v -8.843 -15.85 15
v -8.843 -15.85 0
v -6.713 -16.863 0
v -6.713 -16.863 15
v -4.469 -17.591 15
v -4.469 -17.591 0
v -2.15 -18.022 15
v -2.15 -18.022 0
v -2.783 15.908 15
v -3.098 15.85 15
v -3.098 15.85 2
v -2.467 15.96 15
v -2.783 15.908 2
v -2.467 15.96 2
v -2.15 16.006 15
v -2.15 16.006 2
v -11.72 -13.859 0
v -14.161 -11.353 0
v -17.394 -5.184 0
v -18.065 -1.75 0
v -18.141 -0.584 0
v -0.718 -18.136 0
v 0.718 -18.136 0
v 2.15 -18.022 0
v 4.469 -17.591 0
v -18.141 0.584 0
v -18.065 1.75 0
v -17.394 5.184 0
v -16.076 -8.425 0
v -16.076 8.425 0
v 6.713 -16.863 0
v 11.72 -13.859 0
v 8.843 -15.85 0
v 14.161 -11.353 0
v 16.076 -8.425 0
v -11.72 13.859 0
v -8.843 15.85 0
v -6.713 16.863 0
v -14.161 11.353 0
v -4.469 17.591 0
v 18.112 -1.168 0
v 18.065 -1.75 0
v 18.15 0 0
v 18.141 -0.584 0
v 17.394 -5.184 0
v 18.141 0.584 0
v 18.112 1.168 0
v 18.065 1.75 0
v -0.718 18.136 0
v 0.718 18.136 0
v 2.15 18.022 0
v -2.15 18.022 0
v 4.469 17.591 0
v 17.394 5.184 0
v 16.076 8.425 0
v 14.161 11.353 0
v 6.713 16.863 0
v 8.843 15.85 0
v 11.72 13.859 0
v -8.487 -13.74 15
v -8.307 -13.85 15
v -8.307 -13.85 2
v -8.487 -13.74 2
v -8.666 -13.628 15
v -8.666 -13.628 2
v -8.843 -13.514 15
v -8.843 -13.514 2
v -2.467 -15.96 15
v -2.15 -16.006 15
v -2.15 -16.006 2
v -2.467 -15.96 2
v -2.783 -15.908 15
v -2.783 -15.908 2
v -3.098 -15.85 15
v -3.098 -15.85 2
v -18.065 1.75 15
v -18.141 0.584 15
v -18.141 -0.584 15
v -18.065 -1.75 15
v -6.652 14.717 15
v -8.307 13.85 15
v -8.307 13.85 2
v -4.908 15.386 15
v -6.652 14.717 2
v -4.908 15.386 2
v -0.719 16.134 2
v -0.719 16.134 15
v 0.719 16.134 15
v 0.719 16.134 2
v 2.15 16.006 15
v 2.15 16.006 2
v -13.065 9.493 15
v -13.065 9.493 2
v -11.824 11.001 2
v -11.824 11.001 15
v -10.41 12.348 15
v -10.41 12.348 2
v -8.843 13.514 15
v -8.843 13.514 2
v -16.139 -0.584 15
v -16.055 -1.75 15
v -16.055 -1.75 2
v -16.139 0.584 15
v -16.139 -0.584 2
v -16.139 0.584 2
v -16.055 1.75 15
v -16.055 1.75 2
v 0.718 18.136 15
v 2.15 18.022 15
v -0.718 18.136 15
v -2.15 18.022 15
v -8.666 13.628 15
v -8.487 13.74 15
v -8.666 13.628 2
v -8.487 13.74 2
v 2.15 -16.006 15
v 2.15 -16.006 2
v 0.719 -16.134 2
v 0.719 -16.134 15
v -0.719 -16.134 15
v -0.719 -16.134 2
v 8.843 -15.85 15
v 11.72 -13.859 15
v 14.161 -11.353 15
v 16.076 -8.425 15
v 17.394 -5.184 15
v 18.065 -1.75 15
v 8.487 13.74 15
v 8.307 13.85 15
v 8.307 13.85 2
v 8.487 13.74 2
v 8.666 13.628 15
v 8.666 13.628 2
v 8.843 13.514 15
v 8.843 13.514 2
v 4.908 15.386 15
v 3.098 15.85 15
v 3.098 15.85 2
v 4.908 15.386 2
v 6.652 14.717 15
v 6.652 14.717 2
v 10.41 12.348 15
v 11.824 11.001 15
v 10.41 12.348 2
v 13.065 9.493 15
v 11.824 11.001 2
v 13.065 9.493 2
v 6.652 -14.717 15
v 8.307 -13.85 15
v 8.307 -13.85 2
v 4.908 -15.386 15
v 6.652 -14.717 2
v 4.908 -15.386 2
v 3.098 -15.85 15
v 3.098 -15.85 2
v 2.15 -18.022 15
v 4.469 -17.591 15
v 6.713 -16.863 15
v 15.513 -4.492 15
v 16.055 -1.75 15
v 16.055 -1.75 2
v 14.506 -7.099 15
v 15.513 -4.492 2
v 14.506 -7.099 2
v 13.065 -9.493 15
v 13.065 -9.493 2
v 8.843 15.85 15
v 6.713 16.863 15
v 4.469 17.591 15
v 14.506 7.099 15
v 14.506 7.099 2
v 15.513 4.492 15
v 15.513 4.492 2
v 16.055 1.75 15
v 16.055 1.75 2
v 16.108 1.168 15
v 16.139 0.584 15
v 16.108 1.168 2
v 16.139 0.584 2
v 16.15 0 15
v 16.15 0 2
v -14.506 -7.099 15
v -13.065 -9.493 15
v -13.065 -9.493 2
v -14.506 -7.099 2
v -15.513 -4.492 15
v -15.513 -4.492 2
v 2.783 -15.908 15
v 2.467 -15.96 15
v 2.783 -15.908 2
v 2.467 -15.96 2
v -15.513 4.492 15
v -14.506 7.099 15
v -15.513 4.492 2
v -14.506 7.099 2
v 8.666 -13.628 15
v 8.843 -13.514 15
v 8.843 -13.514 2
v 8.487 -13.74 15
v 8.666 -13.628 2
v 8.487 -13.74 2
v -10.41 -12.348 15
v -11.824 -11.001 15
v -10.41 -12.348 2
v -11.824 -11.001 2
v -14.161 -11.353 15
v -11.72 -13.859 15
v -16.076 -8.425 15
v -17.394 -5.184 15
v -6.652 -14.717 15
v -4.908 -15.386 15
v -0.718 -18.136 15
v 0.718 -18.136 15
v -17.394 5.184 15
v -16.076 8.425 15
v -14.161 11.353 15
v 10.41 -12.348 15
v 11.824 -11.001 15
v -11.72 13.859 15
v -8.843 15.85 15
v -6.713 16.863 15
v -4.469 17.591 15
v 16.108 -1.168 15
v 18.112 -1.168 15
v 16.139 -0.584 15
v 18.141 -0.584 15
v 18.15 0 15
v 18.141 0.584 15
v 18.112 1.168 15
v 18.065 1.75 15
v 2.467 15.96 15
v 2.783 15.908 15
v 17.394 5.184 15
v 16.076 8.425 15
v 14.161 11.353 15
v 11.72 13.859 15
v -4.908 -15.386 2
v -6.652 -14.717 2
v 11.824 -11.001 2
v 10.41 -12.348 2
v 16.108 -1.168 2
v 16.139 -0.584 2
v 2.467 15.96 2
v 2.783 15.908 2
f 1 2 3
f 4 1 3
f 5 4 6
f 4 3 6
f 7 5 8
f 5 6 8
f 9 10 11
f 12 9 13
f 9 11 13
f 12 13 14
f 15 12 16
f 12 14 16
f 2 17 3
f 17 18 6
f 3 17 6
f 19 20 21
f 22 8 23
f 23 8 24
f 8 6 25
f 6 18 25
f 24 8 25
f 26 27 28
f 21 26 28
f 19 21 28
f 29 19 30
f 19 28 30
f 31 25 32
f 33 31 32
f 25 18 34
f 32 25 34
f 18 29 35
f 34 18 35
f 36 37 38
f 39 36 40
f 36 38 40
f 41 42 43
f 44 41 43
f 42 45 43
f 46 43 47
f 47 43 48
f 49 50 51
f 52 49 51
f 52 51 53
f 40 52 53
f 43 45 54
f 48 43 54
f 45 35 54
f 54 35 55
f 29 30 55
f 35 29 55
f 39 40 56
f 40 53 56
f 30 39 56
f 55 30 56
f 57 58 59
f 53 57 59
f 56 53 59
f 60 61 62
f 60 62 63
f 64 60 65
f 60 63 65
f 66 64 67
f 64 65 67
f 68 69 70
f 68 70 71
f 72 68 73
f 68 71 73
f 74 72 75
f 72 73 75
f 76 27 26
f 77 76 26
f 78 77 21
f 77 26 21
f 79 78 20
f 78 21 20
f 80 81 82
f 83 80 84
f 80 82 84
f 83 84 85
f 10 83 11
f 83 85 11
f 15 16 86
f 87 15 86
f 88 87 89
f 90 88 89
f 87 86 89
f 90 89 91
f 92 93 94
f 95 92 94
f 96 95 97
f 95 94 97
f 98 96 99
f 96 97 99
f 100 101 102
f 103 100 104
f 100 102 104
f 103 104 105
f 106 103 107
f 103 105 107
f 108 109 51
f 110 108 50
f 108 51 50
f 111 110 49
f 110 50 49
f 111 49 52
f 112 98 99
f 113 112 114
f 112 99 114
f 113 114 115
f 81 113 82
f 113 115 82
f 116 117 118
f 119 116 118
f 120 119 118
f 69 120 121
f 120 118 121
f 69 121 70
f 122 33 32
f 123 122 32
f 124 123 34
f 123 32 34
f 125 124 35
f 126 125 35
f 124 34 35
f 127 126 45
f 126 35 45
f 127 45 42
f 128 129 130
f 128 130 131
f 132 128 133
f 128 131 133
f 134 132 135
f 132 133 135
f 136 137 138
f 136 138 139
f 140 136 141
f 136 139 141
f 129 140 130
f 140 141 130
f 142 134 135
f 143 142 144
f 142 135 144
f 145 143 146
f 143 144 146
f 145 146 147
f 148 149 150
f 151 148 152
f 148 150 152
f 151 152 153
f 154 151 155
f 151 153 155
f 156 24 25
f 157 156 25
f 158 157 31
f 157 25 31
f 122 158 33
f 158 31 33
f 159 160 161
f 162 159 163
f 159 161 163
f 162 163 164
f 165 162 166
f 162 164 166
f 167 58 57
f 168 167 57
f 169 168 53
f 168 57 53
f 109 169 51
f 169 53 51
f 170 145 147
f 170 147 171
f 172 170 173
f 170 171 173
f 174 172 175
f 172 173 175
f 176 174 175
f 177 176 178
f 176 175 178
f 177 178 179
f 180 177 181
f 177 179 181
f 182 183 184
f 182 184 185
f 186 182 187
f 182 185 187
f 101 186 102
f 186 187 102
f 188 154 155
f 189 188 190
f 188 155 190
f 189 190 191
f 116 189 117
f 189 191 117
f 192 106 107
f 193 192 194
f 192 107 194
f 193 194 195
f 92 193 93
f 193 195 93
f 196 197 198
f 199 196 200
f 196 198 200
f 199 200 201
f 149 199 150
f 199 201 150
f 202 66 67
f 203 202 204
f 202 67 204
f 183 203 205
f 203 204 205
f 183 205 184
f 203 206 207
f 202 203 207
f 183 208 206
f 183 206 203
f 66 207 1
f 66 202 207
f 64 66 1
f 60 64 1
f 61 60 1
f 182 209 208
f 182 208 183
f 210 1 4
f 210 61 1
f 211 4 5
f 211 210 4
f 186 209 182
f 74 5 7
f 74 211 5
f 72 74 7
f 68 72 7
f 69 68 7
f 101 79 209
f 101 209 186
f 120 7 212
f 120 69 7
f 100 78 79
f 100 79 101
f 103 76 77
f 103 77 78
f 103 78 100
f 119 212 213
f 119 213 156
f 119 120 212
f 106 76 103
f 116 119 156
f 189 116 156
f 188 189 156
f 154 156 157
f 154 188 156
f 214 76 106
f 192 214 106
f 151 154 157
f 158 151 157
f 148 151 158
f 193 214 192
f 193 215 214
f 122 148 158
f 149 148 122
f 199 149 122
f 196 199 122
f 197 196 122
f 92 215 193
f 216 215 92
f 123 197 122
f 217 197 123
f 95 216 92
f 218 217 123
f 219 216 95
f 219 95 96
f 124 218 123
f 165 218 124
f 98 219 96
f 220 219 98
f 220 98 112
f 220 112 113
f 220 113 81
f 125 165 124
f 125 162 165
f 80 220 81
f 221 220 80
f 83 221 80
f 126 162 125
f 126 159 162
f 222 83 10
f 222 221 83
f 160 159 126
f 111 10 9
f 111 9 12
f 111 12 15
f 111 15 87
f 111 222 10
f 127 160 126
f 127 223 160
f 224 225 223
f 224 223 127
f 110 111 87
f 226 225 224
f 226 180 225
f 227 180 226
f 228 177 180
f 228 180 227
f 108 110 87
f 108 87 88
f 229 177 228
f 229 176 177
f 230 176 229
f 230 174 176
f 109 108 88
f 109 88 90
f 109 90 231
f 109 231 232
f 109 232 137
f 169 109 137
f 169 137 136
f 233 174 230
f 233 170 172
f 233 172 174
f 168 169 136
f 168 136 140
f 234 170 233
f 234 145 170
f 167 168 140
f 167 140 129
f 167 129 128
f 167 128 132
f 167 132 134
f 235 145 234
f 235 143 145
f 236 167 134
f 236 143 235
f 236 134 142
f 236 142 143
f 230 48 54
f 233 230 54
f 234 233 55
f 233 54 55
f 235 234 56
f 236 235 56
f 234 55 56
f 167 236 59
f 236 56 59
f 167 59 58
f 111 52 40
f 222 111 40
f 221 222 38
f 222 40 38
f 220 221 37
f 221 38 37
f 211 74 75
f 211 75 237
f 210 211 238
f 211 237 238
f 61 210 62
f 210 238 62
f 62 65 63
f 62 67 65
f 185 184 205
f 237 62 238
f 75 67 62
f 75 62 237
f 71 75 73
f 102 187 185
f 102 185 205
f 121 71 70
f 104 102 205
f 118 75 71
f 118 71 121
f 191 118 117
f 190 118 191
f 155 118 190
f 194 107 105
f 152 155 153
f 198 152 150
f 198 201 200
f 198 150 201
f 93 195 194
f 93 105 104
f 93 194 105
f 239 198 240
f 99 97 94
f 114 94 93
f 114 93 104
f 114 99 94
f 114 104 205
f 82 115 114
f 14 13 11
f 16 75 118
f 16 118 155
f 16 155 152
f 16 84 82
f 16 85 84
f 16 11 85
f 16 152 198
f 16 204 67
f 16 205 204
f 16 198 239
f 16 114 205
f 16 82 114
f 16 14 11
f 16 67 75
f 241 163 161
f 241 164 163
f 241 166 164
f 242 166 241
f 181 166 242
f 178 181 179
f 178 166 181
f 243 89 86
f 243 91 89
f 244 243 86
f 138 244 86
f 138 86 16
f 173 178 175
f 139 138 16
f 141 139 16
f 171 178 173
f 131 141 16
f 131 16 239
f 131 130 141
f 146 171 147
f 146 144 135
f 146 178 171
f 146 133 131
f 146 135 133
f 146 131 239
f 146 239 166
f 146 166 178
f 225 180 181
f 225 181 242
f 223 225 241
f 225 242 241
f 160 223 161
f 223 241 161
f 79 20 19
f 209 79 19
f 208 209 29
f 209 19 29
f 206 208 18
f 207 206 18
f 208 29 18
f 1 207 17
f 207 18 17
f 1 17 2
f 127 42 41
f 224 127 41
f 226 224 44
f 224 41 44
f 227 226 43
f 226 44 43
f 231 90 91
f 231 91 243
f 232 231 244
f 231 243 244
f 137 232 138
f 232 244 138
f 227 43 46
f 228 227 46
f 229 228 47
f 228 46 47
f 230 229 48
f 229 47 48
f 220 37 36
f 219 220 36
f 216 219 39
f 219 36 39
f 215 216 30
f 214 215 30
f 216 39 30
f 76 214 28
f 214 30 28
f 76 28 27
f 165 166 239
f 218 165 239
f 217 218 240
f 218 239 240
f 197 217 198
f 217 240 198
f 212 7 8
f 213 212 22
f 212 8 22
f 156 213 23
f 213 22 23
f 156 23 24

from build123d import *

# Parameters (mm, degrees)
F1_DEPTH    = 15
F0_W        = 4.3
F0_H        = 4.3570096321
F0_W_2      = 4.2223602247
F0_H_2      = 3.5
F0_H_3      = 7.7429903679
F0_W_3      = 6.1566238629
F0_H_4      = 2
F0_W_4      = 0.5364525249
F0_W_5      = 2
F1_FACE_R   = 18.15
F1_FACE_R_2 = 16.15
F2_DEPTH    = 2


with BuildPart() as f1:
    # F0 (on Top) → F1 (new body)
    with BuildSketch(Plane.XY):
        with BuildLine():
            ThreePointArc((18.0654366125, -1.75), (18.1288468265, -0.876020971), (18.15, 0))
            ThreePointArc((18.15, 0), (18.1288468265, 0.876020971), (18.0654366125, 1.75))
            Line((18.0654366125, 1.75), (18.0654366125, -1.75))
        make_face()
        with BuildLine():
            Line((16.0549057923, 1.75), (18.0654366125, 1.75))
            ThreePointArc((18.0654366125, 1.75), (15.1894541696, 9.9349374446), (8.8430763878, 15.85))
            Line((8.8430763878, 15.85), (8.8430763878, 13.5137892539))
            ThreePointArc((8.8430763878, 13.5137892539), (11.1372097669, 11.6955144653), (13.0654366125, 9.4929903679))
            ThreePointArc((13.0654366125, 9.4929903679), (15.0660897516, 5.816823841), (16.0549057923, 1.75))
        make_face()
        with BuildLine():
            Line((18.0654366125, -1.75), (18.0654366125, 1.75))
            Line((18.0654366125, 1.75), (16.0549057923, 1.75))
            ThreePointArc((16.0549057923, 1.75), (16.1262089244, 0.8762908918), (16.15, 0))
            ThreePointArc((16.15, 0), (16.1262089244, -0.8762908918), (16.0549057923, -1.75))
            Line((16.0549057923, -1.75), (18.0654366125, -1.75))
        make_face()
        with BuildLine():
            ThreePointArc((8.8430763878, -15.85), (15.1894541696, -9.9349374446), (18.0654366125, -1.75))
            Line((18.0654366125, -1.75), (16.0549057923, -1.75))
            ThreePointArc((16.0549057923, -1.75), (15.0660897516, -5.816823841), (13.0654366125, -9.4929903679))
            ThreePointArc((13.0654366125, -9.4929903679), (11.1372097669, -11.6955144653), (8.8430763878, -13.5137892539))
            Line((8.8430763878, -13.5137892539), (8.8430763878, -15.85))
        make_face()
        with BuildLine():
            Line((3.098386677, 15.85), (8.8430763878, 15.85))
            ThreePointArc((8.8430763878, 15.85), (5.6028166651, 17.2635727883), (2.15, 18.0222085217))
            Line((2.15, 18.0222085217), (2.15, 16.0062487798))
            ThreePointArc((2.15, 16.0062487798), (2.6253559945, 15.9351813891), (3.098386677, 15.85))
        make_face()
        with BuildLine():
            Line((8.8430763878, 13.5137892539), (8.8430763878, 15.85))
            Line((8.8430763878, 15.85), (3.098386677, 15.85))
            ThreePointArc((3.098386677, 15.85), (5.7895221179, 15.0766021917), (8.3066238629, 13.85))
            ThreePointArc((8.3066238629, 13.85), (8.5764977752, 13.684523591), (8.8430763878, 13.5137892539))
        make_face()
        with BuildLine():
            ThreePointArc((2.15, -18.0222085217), (5.6028166651, -17.2635727883), (8.8430763878, -15.85))
            Line((8.8430763878, -15.85), (3.098386677, -15.85))
            ThreePointArc((3.098386677, -15.85), (2.6253559945, -15.9351813891), (2.15, -16.0062487798))
            Line((2.15, -16.0062487798), (2.15, -18.0222085217))
        make_face()
        with BuildLine():
            Line((3.098386677, -15.85), (8.8430763878, -15.85))
            Line((8.8430763878, -15.85), (8.8430763878, -13.5137892539))
            ThreePointArc((8.8430763878, -13.5137892539), (8.5764977752, -13.684523591), (8.3066238629, -13.85))
            ThreePointArc((8.3066238629, -13.85), (5.7895221179, -15.0766021917), (3.098386677, -15.85))
        make_face()
        with BuildLine():
            Line((-2.15, 18.0222085217), (2.15, 18.0222085217))
            ThreePointArc((2.15, 18.0222085217), (0, 18.15), (-2.15, 18.0222085217))
        make_face()
        with BuildLine():
            Line((2.15, 16.0062487798), (2.15, 18.0222085217))
            Line((2.15, 18.0222085217), (-2.15, 18.0222085217))
            Line((-2.15, 18.0222085217), (-2.15, 16.0062487798))
            ThreePointArc((-2.15, 16.0062487798), (0, 16.15), (2.15, 16.0062487798))
        make_face()
        with BuildLine():
            ThreePointArc((-2.15, -18.0222085217), (0, -18.15), (2.15, -18.0222085217))
            Line((2.15, -18.0222085217), (-2.15, -18.0222085217))
        make_face()
        with BuildLine():
            Line((-2.15, -18.0222085217), (2.15, -18.0222085217))
            Line((2.15, -18.0222085217), (2.15, -16.0062487798))
            ThreePointArc((2.15, -16.0062487798), (0, -16.15), (-2.15, -16.0062487798))
            Line((-2.15, -16.0062487798), (-2.15, -18.0222085217))
        make_face()
        with BuildLine():
            Line((-2.15, 16.0062487798), (-2.15, 18.0222085217))
            ThreePointArc((-2.15, 18.0222085217), (-5.6028166651, 17.2635727883), (-8.8430763878, 15.85))
            Line((-8.8430763878, 15.85), (-3.098386677, 15.85))
            ThreePointArc((-3.098386677, 15.85), (-2.6253559945, 15.9351813891), (-2.15, 16.0062487798))
        make_face()
        with BuildLine():
            ThreePointArc((-8.8430763878, -15.85), (-5.6028166651, -17.2635727883), (-2.15, -18.0222085217))
            Line((-2.15, -18.0222085217), (-2.15, -16.0062487798))
            ThreePointArc((-2.15, -16.0062487798), (-2.6253559945, -15.9351813891), (-3.098386677, -15.85))
            Line((-3.098386677, -15.85), (-8.8430763878, -15.85))
        make_face()
        with BuildLine():
            Line((-8.8430763878, 13.5137892539), (-8.8430763878, 15.85))
            ThreePointArc((-8.8430763878, 15.85), (-15.1894541696, 9.9349374446), (-18.0654366125, 1.75))
            Line((-18.0654366125, 1.75), (-16.0549057923, 1.75))
            ThreePointArc((-16.0549057923, 1.75), (-15.0660897516, 5.816823841), (-13.0654366125, 9.4929903679))
            ThreePointArc((-13.0654366125, 9.4929903679), (-11.1372097669, 11.6955144653), (-8.8430763878, 13.5137892539))
        make_face()
        with BuildLine():
            Line((-3.098386677, 15.85), (-8.8430763878, 15.85))
            Line((-8.8430763878, 15.85), (-8.8430763878, 13.5137892539))
            ThreePointArc((-8.8430763878, 13.5137892539), (-8.5764977752, 13.684523591), (-8.3066238629, 13.85))
            ThreePointArc((-8.3066238629, 13.85), (-5.7895221179, 15.0766021917), (-3.098386677, 15.85))
        make_face()
        with BuildLine():
            Line((-8.8430763878, -13.5137892539), (-8.8430763878, -15.85))
            Line((-8.8430763878, -15.85), (-3.098386677, -15.85))
            ThreePointArc((-3.098386677, -15.85), (-5.7895221179, -15.0766021917), (-8.3066238629, -13.85))
            ThreePointArc((-8.3066238629, -13.85), (-8.5764977752, -13.684523591), (-8.8430763878, -13.5137892539))
        make_face()
        with BuildLine():
            ThreePointArc((-18.0654366125, -1.75), (-15.1894541696, -9.9349374446), (-8.8430763878, -15.85))
            Line((-8.8430763878, -15.85), (-8.8430763878, -13.5137892539))
            ThreePointArc((-8.8430763878, -13.5137892539), (-11.1372097669, -11.6955144653), (-13.0654366125, -9.4929903679))
            ThreePointArc((-13.0654366125, -9.4929903679), (-15.0660897516, -5.816823841), (-16.0549057923, -1.75))
            Line((-16.0549057923, -1.75), (-18.0654366125, -1.75))
        make_face()
        with BuildLine():
            Line((-18.0654366125, -1.75), (-18.0654366125, 1.75))
            ThreePointArc((-18.0654366125, 1.75), (-18.15, 0), (-18.0654366125, -1.75))
        make_face()
        with BuildLine():
            Line((-16.0549057923, 1.75), (-18.0654366125, 1.75))
            Line((-18.0654366125, 1.75), (-18.0654366125, -1.75))
            Line((-18.0654366125, -1.75), (-16.0549057923, -1.75))
            ThreePointArc((-16.0549057923, -1.75), (-16.15, 0), (-16.0549057923, 1.75))
        make_face()
    extrude(amount=F1_DEPTH)

    # F0 (on Top) + F1_face (on face) → F2 (join)
    with BuildSketch(Plane.XY):
        with BuildLine():
            Line((-2.15, 18.0222085217), (2.15, 18.0222085217))
            ThreePointArc((2.15, 18.0222085217), (0, 18.15), (-2.15, 18.0222085217))
        make_face()
        with BuildLine():
            Line((-18.0654366125, -1.75), (-18.0654366125, 1.75))
            ThreePointArc((-18.0654366125, 1.75), (-18.15, 0), (-18.0654366125, -1.75))
        make_face()
        with BuildLine():
            ThreePointArc((-2.15, -18.0222085217), (0, -18.15), (2.15, -18.0222085217))
            Line((2.15, -18.0222085217), (-2.15, -18.0222085217))
        make_face()
        with BuildLine():
            ThreePointArc((18.0654366125, -1.75), (18.1288468265, -0.876020971), (18.15, 0))
            ThreePointArc((18.15, 0), (18.1288468265, 0.876020971), (18.0654366125, 1.75))
            Line((18.0654366125, 1.75), (18.0654366125, -1.75))
        make_face()
        with BuildLine():
            Line((3.098386677, 15.85), (8.8430763878, 15.85))
            ThreePointArc((8.8430763878, 15.85), (5.6028166651, 17.2635727883), (2.15, 18.0222085217))
            Line((2.15, 18.0222085217), (2.15, 16.0062487798))
            ThreePointArc((2.15, 16.0062487798), (2.6253559945, 15.9351813891), (3.098386677, 15.85))
        make_face()
        with BuildLine():
            Line((-2.15, 16.0062487798), (-2.15, 18.0222085217))
            ThreePointArc((-2.15, 18.0222085217), (-5.6028166651, 17.2635727883), (-8.8430763878, 15.85))
            Line((-8.8430763878, 15.85), (-3.098386677, 15.85))
            ThreePointArc((-3.098386677, 15.85), (-2.6253559945, 15.9351813891), (-2.15, 16.0062487798))
        make_face()
        with BuildLine():
            ThreePointArc((-8.8430763878, -15.85), (-5.6028166651, -17.2635727883), (-2.15, -18.0222085217))
            Line((-2.15, -18.0222085217), (-2.15, -16.0062487798))
            ThreePointArc((-2.15, -16.0062487798), (-2.6253559945, -15.9351813891), (-3.098386677, -15.85))
            Line((-3.098386677, -15.85), (-8.8430763878, -15.85))
        make_face()
        with BuildLine():
            ThreePointArc((2.15, -18.0222085217), (5.6028166651, -17.2635727883), (8.8430763878, -15.85))
            Line((8.8430763878, -15.85), (3.098386677, -15.85))
            ThreePointArc((3.098386677, -15.85), (2.6253559945, -15.9351813891), (2.15, -16.0062487798))
            Line((2.15, -16.0062487798), (2.15, -18.0222085217))
        make_face()
        with BuildLine():
            Line((16.0549057923, 1.75), (18.0654366125, 1.75))
            ThreePointArc((18.0654366125, 1.75), (15.1894541696, 9.9349374446), (8.8430763878, 15.85))
            Line((8.8430763878, 15.85), (8.8430763878, 13.5137892539))
            ThreePointArc((8.8430763878, 13.5137892539), (11.1372097669, 11.6955144653), (13.0654366125, 9.4929903679))
            ThreePointArc((13.0654366125, 9.4929903679), (15.0660897516, 5.816823841), (16.0549057923, 1.75))
        make_face()
        with BuildLine():
            Line((-8.8430763878, 13.5137892539), (-8.8430763878, 15.85))
            ThreePointArc((-8.8430763878, 15.85), (-15.1894541696, 9.9349374446), (-18.0654366125, 1.75))
            Line((-18.0654366125, 1.75), (-16.0549057923, 1.75))
            ThreePointArc((-16.0549057923, 1.75), (-15.0660897516, 5.816823841), (-13.0654366125, 9.4929903679))
            ThreePointArc((-13.0654366125, 9.4929903679), (-11.1372097669, 11.6955144653), (-8.8430763878, 13.5137892539))
        make_face()
        with BuildLine():
            ThreePointArc((-18.0654366125, -1.75), (-15.1894541696, -9.9349374446), (-8.8430763878, -15.85))
            Line((-8.8430763878, -15.85), (-8.8430763878, -13.5137892539))
            ThreePointArc((-8.8430763878, -13.5137892539), (-11.1372097669, -11.6955144653), (-13.0654366125, -9.4929903679))
            ThreePointArc((-13.0654366125, -9.4929903679), (-15.0660897516, -5.816823841), (-16.0549057923, -1.75))
            Line((-16.0549057923, -1.75), (-18.0654366125, -1.75))
        make_face()
        with BuildLine():
            ThreePointArc((8.8430763878, -15.85), (15.1894541696, -9.9349374446), (18.0654366125, -1.75))
            Line((18.0654366125, -1.75), (16.0549057923, -1.75))
            ThreePointArc((16.0549057923, -1.75), (15.0660897516, -5.816823841), (13.0654366125, -9.4929903679))
            ThreePointArc((13.0654366125, -9.4929903679), (11.1372097669, -11.6955144653), (8.8430763878, -13.5137892539))
            Line((8.8430763878, -13.5137892539), (8.8430763878, -15.85))
        make_face()
        with BuildLine():
            Line((-3.098386677, 15.85), (-8.8430763878, 15.85))
            Line((-8.8430763878, 15.85), (-8.8430763878, 13.5137892539))
            ThreePointArc((-8.8430763878, 13.5137892539), (-8.5764977752, 13.684523591), (-8.3066238629, 13.85))
            ThreePointArc((-8.3066238629, 13.85), (-5.7895221179, 15.0766021917), (-3.098386677, 15.85))
        make_face()
        with BuildLine():
            Line((8.8430763878, 13.5137892539), (8.8430763878, 15.85))
            Line((8.8430763878, 15.85), (3.098386677, 15.85))
            ThreePointArc((3.098386677, 15.85), (5.7895221179, 15.0766021917), (8.3066238629, 13.85))
            ThreePointArc((8.3066238629, 13.85), (8.5764977752, 13.684523591), (8.8430763878, 13.5137892539))
        make_face()
        with BuildLine():
            Line((-8.8430763878, -13.5137892539), (-8.8430763878, -15.85))
            Line((-8.8430763878, -15.85), (-3.098386677, -15.85))
            ThreePointArc((-3.098386677, -15.85), (-5.7895221179, -15.0766021917), (-8.3066238629, -13.85))
            ThreePointArc((-8.3066238629, -13.85), (-8.5764977752, -13.684523591), (-8.8430763878, -13.5137892539))
        make_face()
        with BuildLine():
            Line((3.098386677, -15.85), (8.8430763878, -15.85))
            Line((8.8430763878, -15.85), (8.8430763878, -13.5137892539))
            ThreePointArc((8.8430763878, -13.5137892539), (8.5764977752, -13.684523591), (8.3066238629, -13.85))
            ThreePointArc((8.3066238629, -13.85), (5.7895221179, -15.0766021917), (3.098386677, -15.85))
        make_face()
        with BuildLine():
            Line((2.15, 16.0062487798), (2.15, 18.0222085217))
            Line((2.15, 18.0222085217), (-2.15, 18.0222085217))
            Line((-2.15, 18.0222085217), (-2.15, 16.0062487798))
            ThreePointArc((-2.15, 16.0062487798), (0, 16.15), (2.15, 16.0062487798))
        make_face()
        with BuildLine():
            Line((-2.15, -18.0222085217), (2.15, -18.0222085217))
            Line((2.15, -18.0222085217), (2.15, -16.0062487798))
            ThreePointArc((2.15, -16.0062487798), (0, -16.15), (-2.15, -16.0062487798))
            Line((-2.15, -16.0062487798), (-2.15, -18.0222085217))
        make_face()
        with BuildLine():
            Line((-16.0549057923, 1.75), (-18.0654366125, 1.75))
            Line((-18.0654366125, 1.75), (-18.0654366125, -1.75))
            Line((-18.0654366125, -1.75), (-16.0549057923, -1.75))
            ThreePointArc((-16.0549057923, -1.75), (-16.15, 0), (-16.0549057923, 1.75))
        make_face()
        with BuildLine():
            Line((18.0654366125, -1.75), (18.0654366125, 1.75))
            Line((18.0654366125, 1.75), (16.0549057923, 1.75))
            ThreePointArc((16.0549057923, 1.75), (16.1262089244, 0.8762908918), (16.15, 0))
            ThreePointArc((16.15, 0), (16.1262089244, -0.8762908918), (16.0549057923, -1.75))
            Line((16.0549057923, -1.75), (18.0654366125, -1.75))
        make_face()
        with Locations((0, 11.6714951839)):
            Rectangle(F0_W, F0_H)
        with Locations((10.9542565001, 0)):
            Rectangle(F0_W_2, F0_H_2)
        with Locations((-10.9542565001, 5.6214951839)):
            Rectangle(F0_W_2, F0_H_3)
        with BuildLine():
            Line((2.15, -15.85), (3.098386677, -15.85))
            ThreePointArc((3.098386677, -15.85), (5.7895221179, -15.0766021917), (8.3066238629, -13.85))
            Line((8.3066238629, -13.85), (2.15, -13.85))
            Line((2.15, -13.85), (2.15, -15.85))
        make_face()
        with Locations((-10.9542565001, -5.6214951839)):
            Rectangle(F0_W_2, F0_H_3)
        with BuildLine():
            ThreePointArc((13.0654366125, 9.4929903679), (11.1372097669, 11.6955144653), (8.8430763878, 13.5137892539))
            Line((8.8430763878, 13.5137892539), (8.8430763878, 9.4929903679))
            Line((8.8430763878, 9.4929903679), (13.0654366125, 9.4929903679))
        make_face()
        with BuildLine():
            ThreePointArc((-13.0654366125, -9.4929903679), (-11.1372097669, -11.6955144653), (-8.8430763878, -13.5137892539))
            Line((-8.8430763878, -13.5137892539), (-8.8430763878, -9.4929903679))
            Line((-8.8430763878, -9.4929903679), (-13.0654366125, -9.4929903679))
        make_face()
        with BuildLine():
            Line((8.8430763878, -9.4929903679), (8.8430763878, -13.5137892539))
            ThreePointArc((8.8430763878, -13.5137892539), (11.1372097669, -11.6955144653), (13.0654366125, -9.4929903679))
            Line((13.0654366125, -9.4929903679), (8.8430763878, -9.4929903679))
        make_face()
        with Locations((10.9542565001, 5.6214951839)):
            Rectangle(F0_W_2, F0_H_3)
        with BuildLine():
            ThreePointArc((-13.0654366125, 9.4929903679), (-15.0660897516, 5.816823841), (-16.0549057923, 1.75))
            Line((-16.0549057923, 1.75), (-15.0654366125, 1.75))
            Line((-15.0654366125, 1.75), (-13.0654366125, 1.75))
            Line((-13.0654366125, 1.75), (-13.0654366125, 9.4929903679))
        make_face()
        with BuildLine():
            ThreePointArc((13.0654366125, -9.4929903679), (15.0660897516, -5.816823841), (16.0549057923, -1.75))
            Line((16.0549057923, -1.75), (15.0654366125, -1.75))
            Line((15.0654366125, -1.75), (13.0654366125, -1.75))
            Line((13.0654366125, -1.75), (13.0654366125, -9.4929903679))
        make_face()
        with Locations((0, -5.6214951839)):
            Rectangle(F0_W, F0_H_3)
        with Locations((5.2283119315, 11.6714951839)):
            Rectangle(F0_W_3, F0_H)
        with Locations((-5.2283119315, 5.6214951839)):
            Rectangle(F0_W_3, F0_H_3)
        with Locations((10.9542565001, -5.6214951839)):
            Rectangle(F0_W_2, F0_H_3)
        with Locations((5.2283119315, 0)):
            Rectangle(F0_W_3, F0_H_2)
        with BuildLine():
            Line((15.0654366125, 1.75), (16.0549057923, 1.75))
            ThreePointArc((16.0549057923, 1.75), (15.0660897516, 5.816823841), (13.0654366125, 9.4929903679))
            Line((13.0654366125, 9.4929903679), (13.0654366125, 1.75))
            Line((13.0654366125, 1.75), (15.0654366125, 1.75))
        make_face()
        with BuildLine():
            Line((-2.15, 13.85), (-2.15, 15.85))
            Line((-2.15, 15.85), (-3.098386677, 15.85))
            ThreePointArc((-3.098386677, 15.85), (-5.7895221179, 15.0766021917), (-8.3066238629, 13.85))
            Line((-8.3066238629, 13.85), (-2.15, 13.85))
        make_face()
        with BuildLine():
            Line((-15.0654366125, -1.75), (-16.0549057923, -1.75))
            ThreePointArc((-16.0549057923, -1.75), (-15.0660897516, -5.816823841), (-13.0654366125, -9.4929903679))
            Line((-13.0654366125, -9.4929903679), (-13.0654366125, -1.75))
            Line((-13.0654366125, -1.75), (-15.0654366125, -1.75))
        make_face()
        with Locations((0, 14.85)):
            Rectangle(F0_W, F0_H_4)
        with Locations((-5.2283119315, 0)):
            Rectangle(F0_W_3, F0_H_2)
        with Locations((-5.2283119315, -11.6714951839)):
            Rectangle(F0_W_3, F0_H)
        with BuildLine():
            Line((-8.8430763878, 9.4929903679), (-8.8430763878, 13.5137892539))
            ThreePointArc((-8.8430763878, 13.5137892539), (-11.1372097669, 11.6955144653), (-13.0654366125, 9.4929903679))
            Line((-13.0654366125, 9.4929903679), (-8.8430763878, 9.4929903679))
        make_face()
        with Locations((5.2283119315, -11.6714951839)):
            Rectangle(F0_W_3, F0_H)
        with Locations((0, 5.6214951839)):
            Rectangle(F0_W, F0_H_3)
        with Locations((5.2283119315, 5.6214951839)):
            Rectangle(F0_W_3, F0_H_3)
        with Locations((0, -11.6714951839)):
            Rectangle(F0_W, F0_H)
        with Locations((-10.9542565001, 0)):
            Rectangle(F0_W_2, F0_H_2)
        with Locations((-5.2283119315, 11.6714951839)):
            Rectangle(F0_W_3, F0_H)
        with Locations((-5.2283119315, -5.6214951839)):
            Rectangle(F0_W_3, F0_H_3)
        with Locations((5.2283119315, -5.6214951839)):
            Rectangle(F0_W_3, F0_H_3)
        with Locations((-8.5748501253, 5.6214951839)):
            Rectangle(F0_W_4, F0_H_3)
        with Locations((-8.5748501253, 0)):
            Rectangle(F0_W_4, F0_H_2)
        with BuildLine():
            Line((2.15, 15.85), (2.15, 16.0062487798))
            ThreePointArc((2.15, 16.0062487798), (0, 16.15), (-2.15, 16.0062487798))
            Line((-2.15, 16.0062487798), (-2.15, 15.85))
            Line((-2.15, 15.85), (2.15, 15.85))
        make_face()
        with BuildLine():
            ThreePointArc((8.3066238629, 13.85), (5.7895221179, 15.0766021917), (3.098386677, 15.85))
            Line((3.098386677, 15.85), (2.15, 15.85))
            Line((2.15, 15.85), (2.15, 13.85))
            Line((2.15, 13.85), (8.3066238629, 13.85))
        make_face()
        with BuildLine():
            Line((8.8430763878, 9.4929903679), (8.8430763878, 13.5137892539))
            ThreePointArc((8.8430763878, 13.5137892539), (8.5764977752, 13.684523591), (8.3066238629, 13.85))
            Line((8.3066238629, 13.85), (8.3066238629, 9.4929903679))
            Line((8.3066238629, 9.4929903679), (8.8430763878, 9.4929903679))
        make_face()
        with Locations((0, -14.85)):
            Rectangle(F0_W, F0_H_4)
        with BuildLine():
            Line((-8.8430763878, -9.4929903679), (-8.8430763878, -13.5137892539))
            ThreePointArc((-8.8430763878, -13.5137892539), (-8.5764977752, -13.684523591), (-8.3066238629, -13.85))
            Line((-8.3066238629, -13.85), (-8.3066238629, -9.4929903679))
            Line((-8.3066238629, -9.4929903679), (-8.8430763878, -9.4929903679))
        make_face()
        with BuildLine():
            Line((-3.098386677, -15.85), (-2.15, -15.85))
            Line((-2.15, -15.85), (-2.15, -13.85))
            Line((-2.15, -13.85), (-8.3066238629, -13.85))
            ThreePointArc((-8.3066238629, -13.85), (-5.7895221179, -15.0766021917), (-3.098386677, -15.85))
        make_face()
        with Locations((8.5748501253, 0)):
            Rectangle(F0_W_4, F0_H_2)
        with BuildLine():
            ThreePointArc((-8.3066238629, 13.85), (-8.5764977752, 13.684523591), (-8.8430763878, 13.5137892539))
            Line((-8.8430763878, 13.5137892539), (-8.8430763878, 9.4929903679))
            Line((-8.8430763878, 9.4929903679), (-8.3066238629, 9.4929903679))
            Line((-8.3066238629, 9.4929903679), (-8.3066238629, 13.85))
        make_face()
        with Locations((8.5748501253, -5.6214951839)):
            Rectangle(F0_W_4, F0_H_3)
        with Locations((-8.5748501253, -5.6214951839)):
            Rectangle(F0_W_4, F0_H_3)
        with Locations((8.5748501253, 5.6214951839)):
            Rectangle(F0_W_4, F0_H_3)
        with BuildLine():
            ThreePointArc((8.3066238629, -13.85), (8.5764977752, -13.684523591), (8.8430763878, -13.5137892539))
            Line((8.8430763878, -13.5137892539), (8.8430763878, -9.4929903679))
            Line((8.8430763878, -9.4929903679), (8.3066238629, -9.4929903679))
            Line((8.3066238629, -9.4929903679), (8.3066238629, -13.85))
        make_face()
        with BuildLine():
            Line((-15.0654366125, 1.75), (-16.0549057923, 1.75))
            ThreePointArc((-16.0549057923, 1.75), (-16.15, 0), (-16.0549057923, -1.75))
            Line((-16.0549057923, -1.75), (-15.0654366125, -1.75))
            Line((-15.0654366125, -1.75), (-15.0654366125, 1.75))
        make_face()
        with BuildLine():
            ThreePointArc((-2.15, -16.0062487798), (0, -16.15), (2.15, -16.0062487798))
            Line((2.15, -16.0062487798), (2.15, -15.85))
            Line((2.15, -15.85), (-2.15, -15.85))
            Line((-2.15, -15.85), (-2.15, -16.0062487798))
        make_face()
        with BuildLine():
            ThreePointArc((16.15, 0), (16.1262089244, 0.8762908918), (16.0549057923, 1.75))
            Line((16.0549057923, 1.75), (15.0654366125, 1.75))
            Line((15.0654366125, 1.75), (15.0654366125, -1.75))
            Line((15.0654366125, -1.75), (16.0549057923, -1.75))
            ThreePointArc((16.0549057923, -1.75), (16.1262089244, -0.8762908918), (16.15, 0))
        make_face()
        with Locations((14.0654366125, 0)):
            Rectangle(F0_W_5, F0_H_2)
        with BuildLine():
            ThreePointArc((2.15, -16.0062487798), (2.6253559945, -15.9351813891), (3.098386677, -15.85))
            Line((3.098386677, -15.85), (2.15, -15.85))
            Line((2.15, -15.85), (2.15, -16.0062487798))
        make_face()
        with BuildLine():
            ThreePointArc((-3.098386677, -15.85), (-2.6253559945, -15.9351813891), (-2.15, -16.0062487798))
            Line((-2.15, -16.0062487798), (-2.15, -15.85))
            Line((-2.15, -15.85), (-3.098386677, -15.85))
        make_face()
        with BuildLine():
            Line((2.15, 15.85), (3.098386677, 15.85))
            ThreePointArc((3.098386677, 15.85), (2.6253559945, 15.9351813891), (2.15, 16.0062487798))
            Line((2.15, 16.0062487798), (2.15, 15.85))
        make_face()
        with BuildLine():
            Line((-2.15, 15.85), (-2.15, 16.0062487798))
            ThreePointArc((-2.15, 16.0062487798), (-2.6253559945, 15.9351813891), (-3.098386677, 15.85))
            Line((-3.098386677, 15.85), (-2.15, 15.85))
        make_face()
        with Locations((-14.0654366125, 0)):
            Rectangle(F0_W_5, F0_H_2)
        Rectangle(F0_W, F0_H_2)
    with BuildSketch(Plane(origin=(0, 0, 0), x_dir=(1, 0, 0), z_dir=(0, 0, -1))):
        Circle(F1_FACE_R)
        Circle(F1_FACE_R_2, mode=Mode.SUBTRACT)
    extrude(amount=F2_DEPTH, dir=(0, 0, 1))


solid = f1.part
